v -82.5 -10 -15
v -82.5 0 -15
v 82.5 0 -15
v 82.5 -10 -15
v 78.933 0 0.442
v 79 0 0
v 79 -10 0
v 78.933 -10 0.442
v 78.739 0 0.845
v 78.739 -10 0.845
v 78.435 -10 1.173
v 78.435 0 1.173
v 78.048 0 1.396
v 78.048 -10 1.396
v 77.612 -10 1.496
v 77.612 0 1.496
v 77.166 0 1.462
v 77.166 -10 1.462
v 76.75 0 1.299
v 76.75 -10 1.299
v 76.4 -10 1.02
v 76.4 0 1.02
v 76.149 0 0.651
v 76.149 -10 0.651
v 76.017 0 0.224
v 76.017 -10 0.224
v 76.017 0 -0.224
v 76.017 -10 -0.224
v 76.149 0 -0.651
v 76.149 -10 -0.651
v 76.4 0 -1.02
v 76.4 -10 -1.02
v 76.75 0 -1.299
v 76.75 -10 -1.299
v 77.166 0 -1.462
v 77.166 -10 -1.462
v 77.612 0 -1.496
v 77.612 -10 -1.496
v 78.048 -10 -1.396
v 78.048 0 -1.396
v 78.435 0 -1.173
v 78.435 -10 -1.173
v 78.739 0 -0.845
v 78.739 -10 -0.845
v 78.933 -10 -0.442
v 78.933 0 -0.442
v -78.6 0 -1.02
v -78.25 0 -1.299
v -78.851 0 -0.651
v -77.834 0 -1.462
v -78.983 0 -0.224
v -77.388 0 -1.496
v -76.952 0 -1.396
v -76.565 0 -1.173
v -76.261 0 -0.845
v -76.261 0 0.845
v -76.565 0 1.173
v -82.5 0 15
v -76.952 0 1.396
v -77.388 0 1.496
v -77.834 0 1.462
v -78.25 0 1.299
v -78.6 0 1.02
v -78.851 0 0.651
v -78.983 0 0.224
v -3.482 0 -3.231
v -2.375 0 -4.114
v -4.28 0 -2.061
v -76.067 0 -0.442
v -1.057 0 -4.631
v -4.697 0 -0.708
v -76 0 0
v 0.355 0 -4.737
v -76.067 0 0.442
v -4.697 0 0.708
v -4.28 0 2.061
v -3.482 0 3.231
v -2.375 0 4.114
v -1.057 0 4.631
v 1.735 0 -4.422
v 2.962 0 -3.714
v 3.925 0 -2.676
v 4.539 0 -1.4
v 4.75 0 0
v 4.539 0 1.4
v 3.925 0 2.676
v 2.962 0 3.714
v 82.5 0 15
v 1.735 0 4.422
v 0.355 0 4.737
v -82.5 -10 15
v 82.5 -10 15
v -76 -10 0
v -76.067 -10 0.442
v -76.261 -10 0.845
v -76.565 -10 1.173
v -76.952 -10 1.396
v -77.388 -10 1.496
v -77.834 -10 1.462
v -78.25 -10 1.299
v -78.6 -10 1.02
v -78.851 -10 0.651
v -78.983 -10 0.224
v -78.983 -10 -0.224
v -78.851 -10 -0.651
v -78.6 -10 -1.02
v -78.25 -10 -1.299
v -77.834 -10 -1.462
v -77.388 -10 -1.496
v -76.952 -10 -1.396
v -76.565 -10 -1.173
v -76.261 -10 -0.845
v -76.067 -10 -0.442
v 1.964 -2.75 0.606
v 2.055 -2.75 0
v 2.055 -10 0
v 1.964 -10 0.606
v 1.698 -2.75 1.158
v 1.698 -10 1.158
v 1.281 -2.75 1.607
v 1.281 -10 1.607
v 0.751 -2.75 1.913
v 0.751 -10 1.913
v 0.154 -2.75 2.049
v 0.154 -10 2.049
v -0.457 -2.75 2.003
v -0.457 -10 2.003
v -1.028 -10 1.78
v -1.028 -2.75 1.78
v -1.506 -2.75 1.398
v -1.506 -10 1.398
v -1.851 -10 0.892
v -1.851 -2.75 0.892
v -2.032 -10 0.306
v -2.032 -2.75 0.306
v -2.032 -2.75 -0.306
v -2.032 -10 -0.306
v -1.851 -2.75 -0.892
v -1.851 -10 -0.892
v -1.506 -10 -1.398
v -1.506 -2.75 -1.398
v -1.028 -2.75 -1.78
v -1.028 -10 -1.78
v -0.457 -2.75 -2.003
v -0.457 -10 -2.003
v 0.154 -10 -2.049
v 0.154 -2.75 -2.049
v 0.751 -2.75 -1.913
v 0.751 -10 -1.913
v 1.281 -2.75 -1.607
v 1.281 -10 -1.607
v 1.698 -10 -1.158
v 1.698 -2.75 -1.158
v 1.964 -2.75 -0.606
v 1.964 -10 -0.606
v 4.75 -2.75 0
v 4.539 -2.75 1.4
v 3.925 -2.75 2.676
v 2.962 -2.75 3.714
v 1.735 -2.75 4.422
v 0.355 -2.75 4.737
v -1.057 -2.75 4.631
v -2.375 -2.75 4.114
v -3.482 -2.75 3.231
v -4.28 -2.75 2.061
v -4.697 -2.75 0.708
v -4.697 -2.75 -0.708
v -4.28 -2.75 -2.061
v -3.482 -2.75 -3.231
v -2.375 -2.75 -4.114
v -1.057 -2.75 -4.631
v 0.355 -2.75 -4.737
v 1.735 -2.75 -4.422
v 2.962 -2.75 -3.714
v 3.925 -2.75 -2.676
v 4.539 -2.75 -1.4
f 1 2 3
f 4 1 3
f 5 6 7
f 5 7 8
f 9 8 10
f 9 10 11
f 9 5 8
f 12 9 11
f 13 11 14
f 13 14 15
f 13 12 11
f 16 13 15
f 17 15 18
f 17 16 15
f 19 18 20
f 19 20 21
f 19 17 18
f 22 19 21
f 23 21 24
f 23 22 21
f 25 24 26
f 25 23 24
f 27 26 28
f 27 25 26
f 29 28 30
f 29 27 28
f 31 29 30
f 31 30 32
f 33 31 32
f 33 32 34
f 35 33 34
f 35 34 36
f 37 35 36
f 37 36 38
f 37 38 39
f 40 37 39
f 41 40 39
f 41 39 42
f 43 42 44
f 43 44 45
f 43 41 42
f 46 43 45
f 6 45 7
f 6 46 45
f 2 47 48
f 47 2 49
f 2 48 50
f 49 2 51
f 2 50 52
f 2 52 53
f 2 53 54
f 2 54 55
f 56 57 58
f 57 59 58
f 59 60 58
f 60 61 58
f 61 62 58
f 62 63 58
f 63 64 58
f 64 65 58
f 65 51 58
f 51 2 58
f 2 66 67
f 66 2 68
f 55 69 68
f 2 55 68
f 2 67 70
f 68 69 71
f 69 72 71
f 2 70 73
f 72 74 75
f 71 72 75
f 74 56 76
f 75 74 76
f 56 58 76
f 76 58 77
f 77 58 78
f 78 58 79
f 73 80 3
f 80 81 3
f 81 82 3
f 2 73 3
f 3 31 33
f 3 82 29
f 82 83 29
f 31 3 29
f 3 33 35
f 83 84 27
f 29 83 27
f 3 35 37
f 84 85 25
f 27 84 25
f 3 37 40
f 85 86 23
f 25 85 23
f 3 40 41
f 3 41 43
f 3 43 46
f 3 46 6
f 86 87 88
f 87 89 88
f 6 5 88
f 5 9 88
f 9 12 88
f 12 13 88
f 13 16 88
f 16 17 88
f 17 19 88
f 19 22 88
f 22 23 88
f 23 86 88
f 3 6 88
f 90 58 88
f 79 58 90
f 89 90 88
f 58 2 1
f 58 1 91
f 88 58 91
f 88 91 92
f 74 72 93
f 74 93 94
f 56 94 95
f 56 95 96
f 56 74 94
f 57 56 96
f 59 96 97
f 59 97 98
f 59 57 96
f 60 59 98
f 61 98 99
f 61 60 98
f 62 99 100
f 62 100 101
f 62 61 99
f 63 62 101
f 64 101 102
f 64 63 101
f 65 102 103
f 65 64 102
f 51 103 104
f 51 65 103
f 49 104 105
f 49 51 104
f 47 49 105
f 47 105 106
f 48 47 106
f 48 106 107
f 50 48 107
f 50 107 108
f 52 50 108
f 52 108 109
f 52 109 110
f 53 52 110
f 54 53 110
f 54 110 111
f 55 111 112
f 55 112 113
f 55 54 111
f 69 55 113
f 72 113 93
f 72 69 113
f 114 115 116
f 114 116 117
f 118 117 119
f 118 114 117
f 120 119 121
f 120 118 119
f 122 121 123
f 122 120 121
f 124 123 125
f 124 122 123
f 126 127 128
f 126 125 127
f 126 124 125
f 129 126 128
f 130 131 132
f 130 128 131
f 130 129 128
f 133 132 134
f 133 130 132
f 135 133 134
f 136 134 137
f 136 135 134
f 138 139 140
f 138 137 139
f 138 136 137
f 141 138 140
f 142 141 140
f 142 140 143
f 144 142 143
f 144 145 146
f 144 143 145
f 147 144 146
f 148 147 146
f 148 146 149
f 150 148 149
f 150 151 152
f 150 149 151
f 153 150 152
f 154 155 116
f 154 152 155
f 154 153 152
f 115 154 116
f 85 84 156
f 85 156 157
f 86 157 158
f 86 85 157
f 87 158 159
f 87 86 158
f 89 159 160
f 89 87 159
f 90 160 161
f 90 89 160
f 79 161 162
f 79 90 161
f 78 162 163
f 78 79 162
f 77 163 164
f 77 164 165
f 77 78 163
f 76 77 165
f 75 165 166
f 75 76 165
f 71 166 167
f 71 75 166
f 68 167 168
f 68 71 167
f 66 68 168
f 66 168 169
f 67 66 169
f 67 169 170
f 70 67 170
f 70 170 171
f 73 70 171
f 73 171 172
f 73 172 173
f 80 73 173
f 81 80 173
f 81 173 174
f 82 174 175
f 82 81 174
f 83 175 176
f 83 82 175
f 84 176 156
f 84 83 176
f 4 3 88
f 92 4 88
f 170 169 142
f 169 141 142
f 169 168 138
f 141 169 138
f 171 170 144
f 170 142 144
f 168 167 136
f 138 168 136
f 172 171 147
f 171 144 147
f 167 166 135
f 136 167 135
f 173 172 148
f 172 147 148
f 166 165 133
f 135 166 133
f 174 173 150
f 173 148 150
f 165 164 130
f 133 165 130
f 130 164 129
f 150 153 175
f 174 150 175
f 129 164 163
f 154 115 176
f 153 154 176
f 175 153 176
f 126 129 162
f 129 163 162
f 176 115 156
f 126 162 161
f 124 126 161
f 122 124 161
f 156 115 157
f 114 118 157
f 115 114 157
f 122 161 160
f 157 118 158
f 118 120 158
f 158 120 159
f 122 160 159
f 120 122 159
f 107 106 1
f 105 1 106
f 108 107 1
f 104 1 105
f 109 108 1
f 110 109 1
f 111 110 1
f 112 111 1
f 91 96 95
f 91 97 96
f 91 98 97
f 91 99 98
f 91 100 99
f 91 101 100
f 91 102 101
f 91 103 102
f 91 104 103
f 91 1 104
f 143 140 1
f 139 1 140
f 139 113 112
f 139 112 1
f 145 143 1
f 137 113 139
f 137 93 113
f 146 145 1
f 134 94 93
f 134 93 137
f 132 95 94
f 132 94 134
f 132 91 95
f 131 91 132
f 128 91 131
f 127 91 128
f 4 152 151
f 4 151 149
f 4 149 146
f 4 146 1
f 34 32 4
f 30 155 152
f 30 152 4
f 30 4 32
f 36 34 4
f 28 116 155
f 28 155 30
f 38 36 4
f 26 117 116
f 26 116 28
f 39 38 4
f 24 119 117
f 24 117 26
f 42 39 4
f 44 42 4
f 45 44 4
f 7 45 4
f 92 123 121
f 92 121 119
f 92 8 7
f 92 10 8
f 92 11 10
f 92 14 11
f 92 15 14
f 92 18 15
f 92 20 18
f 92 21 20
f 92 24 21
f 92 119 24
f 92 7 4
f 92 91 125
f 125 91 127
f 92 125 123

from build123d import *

# Parameters (mm, degrees)
F0_W     = 165
F0_H     = 30
F0_R     = 1.5
F0_R_2   = 4.75
F0_R_3   = 2.055
F1_DEPTH = 10
F2_DEPTH = 2.75
F3_DEPTH = 25


with BuildPart() as f1:
    # F0 (on Front) → F1 (new body)
    with BuildSketch(Plane.XZ):
        Rectangle(F0_W, F0_H)
        with Locations((-77.5, 0)):
            Circle(F0_R, mode=Mode.SUBTRACT)
        Circle(F0_R_2, mode=Mode.SUBTRACT)
        with Locations((77.5, 0)):
            Circle(F0_R, mode=Mode.SUBTRACT)
        Circle(F0_R_2)
        Circle(F0_R_3, mode=Mode.SUBTRACT)
        Circle(F0_R_3)
    extrude(amount=F1_DEPTH)

    # F0 (on Front) → F2 (cut)
    with BuildSketch(Plane.XZ):
        Circle(F0_R_2)
        Circle(F0_R_3, mode=Mode.SUBTRACT)
        Circle(F0_R_3)
    extrude(amount=F2_DEPTH, mode=Mode.SUBTRACT)

    # F0 (on Front) → F3 (cut)
    with BuildSketch(Plane.XZ):
        Circle(F0_R_3)
    extrude(amount=F3_DEPTH, mode=Mode.SUBTRACT)


solid = f1.part
